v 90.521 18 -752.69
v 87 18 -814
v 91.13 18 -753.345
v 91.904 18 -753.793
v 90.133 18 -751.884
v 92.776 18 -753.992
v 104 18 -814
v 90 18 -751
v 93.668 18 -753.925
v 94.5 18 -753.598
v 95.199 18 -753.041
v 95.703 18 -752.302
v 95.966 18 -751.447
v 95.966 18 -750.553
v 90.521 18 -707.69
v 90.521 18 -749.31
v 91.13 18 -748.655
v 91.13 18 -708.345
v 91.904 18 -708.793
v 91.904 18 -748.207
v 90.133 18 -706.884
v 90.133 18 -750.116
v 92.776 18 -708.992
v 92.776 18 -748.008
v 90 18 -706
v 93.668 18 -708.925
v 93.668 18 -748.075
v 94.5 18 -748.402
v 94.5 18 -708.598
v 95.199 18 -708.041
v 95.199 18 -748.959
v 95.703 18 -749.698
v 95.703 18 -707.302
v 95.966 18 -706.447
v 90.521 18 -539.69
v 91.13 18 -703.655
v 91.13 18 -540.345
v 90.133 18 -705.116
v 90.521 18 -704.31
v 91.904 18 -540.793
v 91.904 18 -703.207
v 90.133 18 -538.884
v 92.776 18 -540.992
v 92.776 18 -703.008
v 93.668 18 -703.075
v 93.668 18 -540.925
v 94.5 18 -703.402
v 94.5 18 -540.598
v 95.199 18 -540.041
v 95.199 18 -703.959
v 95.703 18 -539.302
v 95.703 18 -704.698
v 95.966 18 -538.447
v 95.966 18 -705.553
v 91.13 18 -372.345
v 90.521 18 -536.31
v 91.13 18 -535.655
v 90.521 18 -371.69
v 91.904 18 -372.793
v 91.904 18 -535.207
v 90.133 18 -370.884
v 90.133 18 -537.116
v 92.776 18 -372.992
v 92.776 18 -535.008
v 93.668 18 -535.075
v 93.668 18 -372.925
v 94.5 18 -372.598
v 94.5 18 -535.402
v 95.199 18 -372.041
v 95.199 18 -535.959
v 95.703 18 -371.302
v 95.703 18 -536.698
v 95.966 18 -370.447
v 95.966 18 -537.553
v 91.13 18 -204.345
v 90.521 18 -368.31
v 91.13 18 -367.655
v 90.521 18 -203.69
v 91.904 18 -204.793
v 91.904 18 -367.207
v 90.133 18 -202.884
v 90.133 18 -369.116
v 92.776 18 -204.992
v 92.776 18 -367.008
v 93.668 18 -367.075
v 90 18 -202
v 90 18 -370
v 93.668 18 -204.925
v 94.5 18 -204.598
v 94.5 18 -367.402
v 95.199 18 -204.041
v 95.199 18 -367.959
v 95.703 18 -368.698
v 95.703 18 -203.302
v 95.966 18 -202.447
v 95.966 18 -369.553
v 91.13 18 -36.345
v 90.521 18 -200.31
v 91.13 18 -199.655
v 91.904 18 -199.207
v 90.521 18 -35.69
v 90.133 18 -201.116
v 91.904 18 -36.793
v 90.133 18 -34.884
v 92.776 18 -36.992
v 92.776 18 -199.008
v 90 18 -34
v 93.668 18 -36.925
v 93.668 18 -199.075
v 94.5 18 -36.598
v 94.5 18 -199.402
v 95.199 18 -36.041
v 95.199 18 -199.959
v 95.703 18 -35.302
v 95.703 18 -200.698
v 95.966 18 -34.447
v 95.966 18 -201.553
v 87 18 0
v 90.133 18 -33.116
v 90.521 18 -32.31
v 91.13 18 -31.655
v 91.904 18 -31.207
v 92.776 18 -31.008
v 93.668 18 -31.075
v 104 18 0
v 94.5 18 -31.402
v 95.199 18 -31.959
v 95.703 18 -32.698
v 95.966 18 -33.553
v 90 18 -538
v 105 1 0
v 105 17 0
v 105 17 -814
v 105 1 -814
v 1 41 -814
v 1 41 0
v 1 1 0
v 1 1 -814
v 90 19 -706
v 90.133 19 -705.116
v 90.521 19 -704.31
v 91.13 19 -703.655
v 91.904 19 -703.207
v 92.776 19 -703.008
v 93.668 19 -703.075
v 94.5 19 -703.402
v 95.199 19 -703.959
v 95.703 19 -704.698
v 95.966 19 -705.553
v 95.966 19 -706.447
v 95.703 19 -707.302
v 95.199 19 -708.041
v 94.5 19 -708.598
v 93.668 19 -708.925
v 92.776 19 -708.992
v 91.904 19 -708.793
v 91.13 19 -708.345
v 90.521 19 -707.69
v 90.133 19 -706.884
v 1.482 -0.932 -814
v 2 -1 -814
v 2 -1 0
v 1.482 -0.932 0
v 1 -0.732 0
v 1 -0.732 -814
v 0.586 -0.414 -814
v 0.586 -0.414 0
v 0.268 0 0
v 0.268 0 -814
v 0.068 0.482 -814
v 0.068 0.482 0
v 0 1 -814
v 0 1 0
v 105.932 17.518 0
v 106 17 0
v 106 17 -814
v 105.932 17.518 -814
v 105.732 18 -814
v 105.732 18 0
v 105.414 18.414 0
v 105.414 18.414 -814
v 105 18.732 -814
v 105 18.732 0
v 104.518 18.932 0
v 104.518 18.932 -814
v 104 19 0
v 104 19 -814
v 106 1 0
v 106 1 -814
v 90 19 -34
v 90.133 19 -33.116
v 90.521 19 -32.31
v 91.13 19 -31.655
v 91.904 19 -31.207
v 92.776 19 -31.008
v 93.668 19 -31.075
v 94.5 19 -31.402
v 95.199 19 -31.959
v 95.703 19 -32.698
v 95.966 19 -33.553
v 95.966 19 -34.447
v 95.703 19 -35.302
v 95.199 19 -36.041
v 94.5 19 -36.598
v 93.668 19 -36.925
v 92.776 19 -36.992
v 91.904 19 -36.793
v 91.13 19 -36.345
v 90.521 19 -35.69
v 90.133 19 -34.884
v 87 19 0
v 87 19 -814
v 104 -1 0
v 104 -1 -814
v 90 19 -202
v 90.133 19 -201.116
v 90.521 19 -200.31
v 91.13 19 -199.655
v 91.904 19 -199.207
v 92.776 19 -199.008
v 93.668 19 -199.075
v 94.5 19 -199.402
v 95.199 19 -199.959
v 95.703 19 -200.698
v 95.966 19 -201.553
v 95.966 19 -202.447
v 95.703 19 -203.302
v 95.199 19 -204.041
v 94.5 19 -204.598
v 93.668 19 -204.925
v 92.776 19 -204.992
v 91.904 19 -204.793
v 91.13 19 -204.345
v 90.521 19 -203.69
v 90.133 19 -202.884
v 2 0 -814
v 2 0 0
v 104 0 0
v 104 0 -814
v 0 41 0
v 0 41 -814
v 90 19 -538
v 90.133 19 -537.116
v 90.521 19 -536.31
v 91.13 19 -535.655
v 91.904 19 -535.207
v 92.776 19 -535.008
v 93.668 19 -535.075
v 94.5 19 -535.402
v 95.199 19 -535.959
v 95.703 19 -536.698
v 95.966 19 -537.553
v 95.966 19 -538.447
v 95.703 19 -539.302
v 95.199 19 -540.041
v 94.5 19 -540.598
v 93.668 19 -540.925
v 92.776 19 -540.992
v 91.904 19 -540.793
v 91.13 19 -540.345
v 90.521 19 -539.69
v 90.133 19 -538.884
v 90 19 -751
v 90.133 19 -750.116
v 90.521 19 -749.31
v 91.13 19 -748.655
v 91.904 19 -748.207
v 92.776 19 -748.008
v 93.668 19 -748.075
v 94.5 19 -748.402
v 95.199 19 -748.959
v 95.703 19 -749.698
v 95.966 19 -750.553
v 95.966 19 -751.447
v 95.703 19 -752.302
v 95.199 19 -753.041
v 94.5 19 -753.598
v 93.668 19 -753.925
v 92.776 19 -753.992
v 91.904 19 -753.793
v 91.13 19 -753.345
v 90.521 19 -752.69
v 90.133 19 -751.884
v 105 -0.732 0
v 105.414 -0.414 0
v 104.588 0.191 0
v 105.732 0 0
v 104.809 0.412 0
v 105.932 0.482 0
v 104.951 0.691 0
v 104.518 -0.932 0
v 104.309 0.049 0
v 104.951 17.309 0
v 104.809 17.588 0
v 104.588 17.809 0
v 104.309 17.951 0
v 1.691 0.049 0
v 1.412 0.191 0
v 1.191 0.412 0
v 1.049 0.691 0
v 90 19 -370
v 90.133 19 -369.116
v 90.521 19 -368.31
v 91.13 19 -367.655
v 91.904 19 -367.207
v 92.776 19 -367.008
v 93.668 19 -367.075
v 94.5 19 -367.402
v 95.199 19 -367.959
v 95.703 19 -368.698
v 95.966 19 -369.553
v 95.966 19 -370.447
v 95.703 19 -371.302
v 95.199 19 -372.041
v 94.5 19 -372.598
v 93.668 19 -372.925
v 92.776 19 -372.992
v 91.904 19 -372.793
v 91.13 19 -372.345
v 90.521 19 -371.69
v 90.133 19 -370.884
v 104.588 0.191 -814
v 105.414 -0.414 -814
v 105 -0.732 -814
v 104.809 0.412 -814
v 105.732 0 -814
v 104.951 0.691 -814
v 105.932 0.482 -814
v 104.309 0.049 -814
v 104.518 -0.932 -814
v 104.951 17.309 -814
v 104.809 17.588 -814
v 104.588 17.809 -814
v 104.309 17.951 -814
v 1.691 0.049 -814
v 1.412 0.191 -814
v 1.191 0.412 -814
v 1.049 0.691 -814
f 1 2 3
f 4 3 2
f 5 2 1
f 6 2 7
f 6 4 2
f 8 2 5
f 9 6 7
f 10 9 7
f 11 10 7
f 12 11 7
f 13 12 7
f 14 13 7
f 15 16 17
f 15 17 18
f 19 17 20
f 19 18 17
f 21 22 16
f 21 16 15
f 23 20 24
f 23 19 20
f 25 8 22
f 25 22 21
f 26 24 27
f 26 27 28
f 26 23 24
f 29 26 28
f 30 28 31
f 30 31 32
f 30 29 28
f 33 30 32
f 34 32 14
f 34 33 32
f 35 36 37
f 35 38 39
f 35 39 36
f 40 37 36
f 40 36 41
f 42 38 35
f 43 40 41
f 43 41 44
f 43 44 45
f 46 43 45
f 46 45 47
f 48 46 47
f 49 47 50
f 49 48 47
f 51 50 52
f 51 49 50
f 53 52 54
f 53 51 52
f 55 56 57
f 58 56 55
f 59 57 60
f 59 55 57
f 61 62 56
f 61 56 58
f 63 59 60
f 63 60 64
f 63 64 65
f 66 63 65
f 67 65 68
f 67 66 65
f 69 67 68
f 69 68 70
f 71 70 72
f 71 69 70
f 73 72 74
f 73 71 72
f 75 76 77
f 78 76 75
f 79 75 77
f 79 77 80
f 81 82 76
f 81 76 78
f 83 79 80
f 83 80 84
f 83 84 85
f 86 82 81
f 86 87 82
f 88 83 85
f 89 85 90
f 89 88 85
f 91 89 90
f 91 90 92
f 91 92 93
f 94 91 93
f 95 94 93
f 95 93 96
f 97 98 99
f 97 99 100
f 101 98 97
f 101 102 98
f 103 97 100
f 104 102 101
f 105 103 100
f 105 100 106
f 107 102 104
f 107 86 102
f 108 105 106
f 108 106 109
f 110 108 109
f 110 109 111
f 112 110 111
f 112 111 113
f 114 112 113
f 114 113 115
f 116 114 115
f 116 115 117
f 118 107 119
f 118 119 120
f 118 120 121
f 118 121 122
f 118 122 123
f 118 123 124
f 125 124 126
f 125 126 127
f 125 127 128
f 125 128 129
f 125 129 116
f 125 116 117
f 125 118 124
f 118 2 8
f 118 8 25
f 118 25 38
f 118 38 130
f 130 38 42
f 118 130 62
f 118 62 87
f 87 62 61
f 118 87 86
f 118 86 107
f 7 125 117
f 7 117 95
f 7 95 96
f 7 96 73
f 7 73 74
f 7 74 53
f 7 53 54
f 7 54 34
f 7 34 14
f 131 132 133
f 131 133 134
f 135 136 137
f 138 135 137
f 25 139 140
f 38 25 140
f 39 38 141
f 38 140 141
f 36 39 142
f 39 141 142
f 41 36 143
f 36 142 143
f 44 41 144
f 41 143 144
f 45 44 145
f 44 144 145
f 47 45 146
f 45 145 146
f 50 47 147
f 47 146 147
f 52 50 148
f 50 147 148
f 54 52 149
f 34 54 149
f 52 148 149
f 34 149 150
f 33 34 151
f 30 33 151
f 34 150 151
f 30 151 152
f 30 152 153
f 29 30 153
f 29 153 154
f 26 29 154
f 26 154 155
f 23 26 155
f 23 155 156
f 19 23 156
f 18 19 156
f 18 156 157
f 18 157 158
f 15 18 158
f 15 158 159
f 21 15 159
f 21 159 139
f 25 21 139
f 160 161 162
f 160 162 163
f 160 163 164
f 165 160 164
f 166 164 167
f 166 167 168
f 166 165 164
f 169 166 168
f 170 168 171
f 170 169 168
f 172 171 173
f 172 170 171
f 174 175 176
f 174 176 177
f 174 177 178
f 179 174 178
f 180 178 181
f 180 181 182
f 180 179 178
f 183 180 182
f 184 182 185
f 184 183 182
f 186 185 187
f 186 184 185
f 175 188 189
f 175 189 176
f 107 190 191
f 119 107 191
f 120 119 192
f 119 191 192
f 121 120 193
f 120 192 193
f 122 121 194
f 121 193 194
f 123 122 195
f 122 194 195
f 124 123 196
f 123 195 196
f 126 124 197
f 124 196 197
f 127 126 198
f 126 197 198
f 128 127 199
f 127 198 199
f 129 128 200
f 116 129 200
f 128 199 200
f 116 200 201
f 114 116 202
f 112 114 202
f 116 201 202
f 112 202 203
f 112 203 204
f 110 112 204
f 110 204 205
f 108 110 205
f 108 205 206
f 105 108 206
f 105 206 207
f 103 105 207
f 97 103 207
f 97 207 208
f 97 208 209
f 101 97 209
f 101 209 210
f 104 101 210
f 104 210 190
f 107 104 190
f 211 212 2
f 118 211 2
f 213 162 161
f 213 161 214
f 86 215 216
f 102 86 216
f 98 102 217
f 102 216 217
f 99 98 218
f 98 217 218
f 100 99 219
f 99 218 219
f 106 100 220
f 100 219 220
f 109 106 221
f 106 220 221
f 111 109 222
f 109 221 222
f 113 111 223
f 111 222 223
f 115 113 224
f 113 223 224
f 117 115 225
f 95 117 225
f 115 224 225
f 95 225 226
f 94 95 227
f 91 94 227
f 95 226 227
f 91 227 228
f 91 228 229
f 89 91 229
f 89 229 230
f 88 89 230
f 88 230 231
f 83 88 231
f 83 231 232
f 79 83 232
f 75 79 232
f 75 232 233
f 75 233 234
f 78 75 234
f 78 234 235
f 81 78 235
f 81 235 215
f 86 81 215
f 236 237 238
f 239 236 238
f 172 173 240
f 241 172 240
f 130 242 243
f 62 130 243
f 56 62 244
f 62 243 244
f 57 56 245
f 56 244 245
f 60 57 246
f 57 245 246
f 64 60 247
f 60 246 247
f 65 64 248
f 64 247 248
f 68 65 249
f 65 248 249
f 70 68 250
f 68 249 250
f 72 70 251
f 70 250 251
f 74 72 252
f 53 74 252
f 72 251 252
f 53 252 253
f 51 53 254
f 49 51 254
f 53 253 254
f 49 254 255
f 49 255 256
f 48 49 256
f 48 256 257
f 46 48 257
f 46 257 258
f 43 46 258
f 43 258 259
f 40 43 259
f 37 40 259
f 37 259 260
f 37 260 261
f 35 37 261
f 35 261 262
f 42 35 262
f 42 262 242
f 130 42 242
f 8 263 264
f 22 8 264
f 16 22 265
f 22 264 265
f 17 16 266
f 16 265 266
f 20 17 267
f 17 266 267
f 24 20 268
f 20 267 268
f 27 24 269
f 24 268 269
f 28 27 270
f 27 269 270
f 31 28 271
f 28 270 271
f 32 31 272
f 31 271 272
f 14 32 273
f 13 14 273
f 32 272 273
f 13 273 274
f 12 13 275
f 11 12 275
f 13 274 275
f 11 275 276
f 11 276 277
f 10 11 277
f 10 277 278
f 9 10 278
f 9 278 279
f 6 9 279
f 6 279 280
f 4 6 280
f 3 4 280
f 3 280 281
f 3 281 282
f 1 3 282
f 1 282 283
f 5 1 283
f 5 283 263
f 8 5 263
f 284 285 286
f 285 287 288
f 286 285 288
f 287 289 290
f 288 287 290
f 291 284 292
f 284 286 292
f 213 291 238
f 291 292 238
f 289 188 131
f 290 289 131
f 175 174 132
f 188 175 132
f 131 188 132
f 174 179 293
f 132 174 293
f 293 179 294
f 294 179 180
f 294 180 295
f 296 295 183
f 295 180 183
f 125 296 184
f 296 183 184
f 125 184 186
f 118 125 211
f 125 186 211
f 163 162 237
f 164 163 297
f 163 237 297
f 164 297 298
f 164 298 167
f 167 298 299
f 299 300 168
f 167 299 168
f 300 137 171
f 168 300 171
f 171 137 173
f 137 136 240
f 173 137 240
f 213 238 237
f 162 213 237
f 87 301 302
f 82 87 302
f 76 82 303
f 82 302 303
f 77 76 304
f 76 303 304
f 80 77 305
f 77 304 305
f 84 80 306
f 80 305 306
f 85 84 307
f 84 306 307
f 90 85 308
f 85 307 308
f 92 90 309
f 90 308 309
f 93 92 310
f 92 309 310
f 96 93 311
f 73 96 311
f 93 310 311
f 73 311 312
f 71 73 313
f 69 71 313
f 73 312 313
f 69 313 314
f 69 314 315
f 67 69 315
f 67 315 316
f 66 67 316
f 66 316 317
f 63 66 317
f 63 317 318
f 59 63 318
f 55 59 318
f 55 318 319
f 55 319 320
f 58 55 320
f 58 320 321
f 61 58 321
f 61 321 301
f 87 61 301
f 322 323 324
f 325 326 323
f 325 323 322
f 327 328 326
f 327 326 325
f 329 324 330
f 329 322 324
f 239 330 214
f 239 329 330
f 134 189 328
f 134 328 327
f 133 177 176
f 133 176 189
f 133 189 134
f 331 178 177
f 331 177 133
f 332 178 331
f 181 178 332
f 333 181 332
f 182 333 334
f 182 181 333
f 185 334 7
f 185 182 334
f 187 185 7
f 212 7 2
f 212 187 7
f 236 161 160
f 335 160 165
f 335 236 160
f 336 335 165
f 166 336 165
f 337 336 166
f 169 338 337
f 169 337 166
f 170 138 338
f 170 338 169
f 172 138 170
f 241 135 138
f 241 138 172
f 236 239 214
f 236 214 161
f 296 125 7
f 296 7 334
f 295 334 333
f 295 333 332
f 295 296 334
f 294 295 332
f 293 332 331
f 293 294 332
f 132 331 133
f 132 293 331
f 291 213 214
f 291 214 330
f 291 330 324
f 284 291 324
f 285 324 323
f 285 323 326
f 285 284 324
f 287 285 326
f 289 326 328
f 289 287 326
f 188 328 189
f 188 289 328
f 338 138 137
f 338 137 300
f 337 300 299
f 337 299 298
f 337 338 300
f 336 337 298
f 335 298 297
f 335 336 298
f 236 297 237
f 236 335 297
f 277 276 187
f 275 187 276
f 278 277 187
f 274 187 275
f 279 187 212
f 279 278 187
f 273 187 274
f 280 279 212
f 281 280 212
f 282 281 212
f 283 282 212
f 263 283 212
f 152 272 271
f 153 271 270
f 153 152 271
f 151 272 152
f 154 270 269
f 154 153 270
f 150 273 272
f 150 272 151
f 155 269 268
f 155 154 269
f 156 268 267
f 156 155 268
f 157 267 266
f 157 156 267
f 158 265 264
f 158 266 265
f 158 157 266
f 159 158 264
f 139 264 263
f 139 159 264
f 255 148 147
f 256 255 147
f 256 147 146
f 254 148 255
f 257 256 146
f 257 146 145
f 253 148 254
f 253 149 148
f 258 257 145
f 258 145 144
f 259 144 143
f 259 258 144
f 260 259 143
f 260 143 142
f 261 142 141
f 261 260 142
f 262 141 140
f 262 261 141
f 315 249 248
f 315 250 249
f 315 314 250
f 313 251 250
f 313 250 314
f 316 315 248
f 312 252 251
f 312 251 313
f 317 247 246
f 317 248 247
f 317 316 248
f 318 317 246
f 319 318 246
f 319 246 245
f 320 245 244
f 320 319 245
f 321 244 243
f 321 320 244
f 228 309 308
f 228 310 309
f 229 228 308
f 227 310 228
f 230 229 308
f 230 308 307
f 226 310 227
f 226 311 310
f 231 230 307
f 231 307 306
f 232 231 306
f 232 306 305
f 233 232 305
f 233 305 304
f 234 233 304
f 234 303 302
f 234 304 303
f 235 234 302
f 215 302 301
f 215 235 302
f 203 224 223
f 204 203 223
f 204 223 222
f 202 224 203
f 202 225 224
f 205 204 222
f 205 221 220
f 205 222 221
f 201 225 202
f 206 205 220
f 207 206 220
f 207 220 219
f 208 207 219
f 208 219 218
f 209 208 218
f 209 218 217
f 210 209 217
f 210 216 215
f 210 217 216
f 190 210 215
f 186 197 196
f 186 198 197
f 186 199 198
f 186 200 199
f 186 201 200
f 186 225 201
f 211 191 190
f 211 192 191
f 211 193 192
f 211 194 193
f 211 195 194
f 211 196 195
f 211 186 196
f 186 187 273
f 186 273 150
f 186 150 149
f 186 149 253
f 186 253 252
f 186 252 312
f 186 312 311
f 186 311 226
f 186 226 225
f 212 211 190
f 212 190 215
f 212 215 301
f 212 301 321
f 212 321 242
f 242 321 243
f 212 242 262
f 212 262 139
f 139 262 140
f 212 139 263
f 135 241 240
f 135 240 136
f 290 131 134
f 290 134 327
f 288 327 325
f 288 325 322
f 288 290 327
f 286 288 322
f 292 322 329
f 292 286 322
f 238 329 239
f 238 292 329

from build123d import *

# Parameters (mm, degrees)
SKETCH1_W                    = 106
SKETCH1_H                    = 814
BASE_FLANGE1_DEPTH           = 1
EDGE_FLANGE1_STRIP_W         = 6
EDGE_FLANGE1_STRIP_H         = 1
EDGE_FLANGE1_STRIP_CUT_DEPTH = 814
EDGE_FLANGE1_DEPTH           = 814
EDGE_FLANGE2_STRIP_W         = 6
EDGE_FLANGE2_STRIP_H         = 1
EDGE_FLANGE2_STRIP_CUT_DEPTH = 814
EDGE_FLANGE2_DEPTH           = 814
EDGE_FLANGE4_STRIP_W         = 6
EDGE_FLANGE4_STRIP_H         = 1
EDGE_FLANGE4_STRIP_CUT_DEPTH = 814
EDGE_FLANGE4_DEPTH           = 814
SKETCH19_R                   = 3
CUT_EXTRUDE2_DEPTH           = 10


# Sheet-metal steps are written as plain solids
with BuildPart() as part:
    # Sketch1 → Base-Flange1 (new body)
    with BuildSketch(Plane(origin=(0, 0, 0), x_dir=(1, 0, 0), z_dir=(0, 1, 0))):
        with Locations((53, 407)):
            Rectangle(SKETCH1_W, SKETCH1_H)
    extrude(amount=-BASE_FLANGE1_DEPTH)

    # Edge-Flange1 strip (across the edge) → Edge-Flange1 strip cut (cut)
    with BuildSketch(Plane(origin=(106, 0, 0), x_dir=(-1, 0, 0), z_dir=(0, 0, -1))):
        with Locations((-1, -0.5)):
            Rectangle(EDGE_FLANGE1_STRIP_W, EDGE_FLANGE1_STRIP_H)
    extrude(amount=EDGE_FLANGE1_STRIP_CUT_DEPTH, mode=Mode.SUBTRACT)

    # Edge-Flange1 section (across the edge) → Edge-Flange1 (add)
    with BuildSketch(Plane(origin=(106, 0, 0), x_dir=(-1, 0, 0), z_dir=(0, 0, -1))):
        with BuildLine():
            Line((0, 1), (0, 19))
            Line((0, 19), (1, 19))
            Line((1, 19), (1, 1))
            ThreePointArc((1, 1), (1.292893219, 0.292893219), (2, 0))
            Line((2, 0), (2, -1))
            ThreePointArc((2, -1), (0.585786438, -0.414213562), (0, 1))
        make_face()
    extrude(amount=EDGE_FLANGE1_DEPTH)

    # Edge-Flange2 strip (across the edge) → Edge-Flange2 strip cut (cut)
    with BuildSketch(Plane(origin=(105, 19, 0), x_dir=(0, -1, 0), z_dir=(0, 0, -1))):
        with Locations((-1, -0.5)):
            Rectangle(EDGE_FLANGE2_STRIP_W, EDGE_FLANGE2_STRIP_H)
    extrude(amount=EDGE_FLANGE2_STRIP_CUT_DEPTH, mode=Mode.SUBTRACT)

    # Edge-Flange2 section (across the edge) → Edge-Flange2 (add)
    with BuildSketch(Plane(origin=(105, 19, 0), x_dir=(0, -1, 0), z_dir=(0, 0, -1))):
        with BuildLine():
            Line((0, 1), (0, 18))
            Line((0, 18), (1, 18))
            Line((1, 18), (1, 1))
            ThreePointArc((1, 1), (1.292893219, 0.292893219), (2, 0))
            Line((2, 0), (2, -1))
            ThreePointArc((2, -1), (0.585786438, -0.414213562), (0, 1))
        make_face()
    extrude(amount=EDGE_FLANGE2_DEPTH)

    # Edge-Flange4 strip (across the edge) → Edge-Flange4 strip cut (cut)
    with BuildSketch(Plane.XY.offset(-814)):
        with Locations((-1, -0.5)):
            Rectangle(EDGE_FLANGE4_STRIP_W, EDGE_FLANGE4_STRIP_H)
    extrude(amount=EDGE_FLANGE4_STRIP_CUT_DEPTH, mode=Mode.SUBTRACT)

    # Edge-Flange4 section (across the edge) → Edge-Flange4 (add)
    with BuildSketch(Plane.XY.offset(-814)):
        with BuildLine():
            Line((0, 1), (0, 41))
            Line((0, 41), (1, 41))
            Line((1, 41), (1, 1))
            ThreePointArc((1, 1), (1.292893219, 0.292893219), (2, 0))
            Line((2, 0), (2, -1))
            ThreePointArc((2, -1), (0.585786438, -0.414213562), (0, 1))
        make_face()
    extrude(amount=EDGE_FLANGE4_DEPTH)

    # Sketch19 → Cut-Extrude2 (cut)
    with BuildSketch(Plane(origin=(0, 19, 0), x_dir=(1, 0, 0), z_dir=(0, 1, 0))):
        with Locations(Location((93, 751, 0), (0, 0, 180))):
            Circle(SKETCH19_R)
        with Locations(Location((93, 706, 0), (0, 0, 180))):
            Circle(SKETCH19_R)
        with Locations(Location((93, 538, 0), (0, 0, 180))):
            Circle(SKETCH19_R)
        with Locations(Location((93, 370, 0), (0, 0, 180))):
            Circle(SKETCH19_R)
        with Locations(Location((93, 202, 0), (0, 0, 180))):
            Circle(SKETCH19_R)
        with Locations(Location((93, 34, 0), (0, 0, 180))):
            Circle(SKETCH19_R)
    extrude(amount=-CUT_EXTRUDE2_DEPTH, mode=Mode.SUBTRACT)


solid = part.part
